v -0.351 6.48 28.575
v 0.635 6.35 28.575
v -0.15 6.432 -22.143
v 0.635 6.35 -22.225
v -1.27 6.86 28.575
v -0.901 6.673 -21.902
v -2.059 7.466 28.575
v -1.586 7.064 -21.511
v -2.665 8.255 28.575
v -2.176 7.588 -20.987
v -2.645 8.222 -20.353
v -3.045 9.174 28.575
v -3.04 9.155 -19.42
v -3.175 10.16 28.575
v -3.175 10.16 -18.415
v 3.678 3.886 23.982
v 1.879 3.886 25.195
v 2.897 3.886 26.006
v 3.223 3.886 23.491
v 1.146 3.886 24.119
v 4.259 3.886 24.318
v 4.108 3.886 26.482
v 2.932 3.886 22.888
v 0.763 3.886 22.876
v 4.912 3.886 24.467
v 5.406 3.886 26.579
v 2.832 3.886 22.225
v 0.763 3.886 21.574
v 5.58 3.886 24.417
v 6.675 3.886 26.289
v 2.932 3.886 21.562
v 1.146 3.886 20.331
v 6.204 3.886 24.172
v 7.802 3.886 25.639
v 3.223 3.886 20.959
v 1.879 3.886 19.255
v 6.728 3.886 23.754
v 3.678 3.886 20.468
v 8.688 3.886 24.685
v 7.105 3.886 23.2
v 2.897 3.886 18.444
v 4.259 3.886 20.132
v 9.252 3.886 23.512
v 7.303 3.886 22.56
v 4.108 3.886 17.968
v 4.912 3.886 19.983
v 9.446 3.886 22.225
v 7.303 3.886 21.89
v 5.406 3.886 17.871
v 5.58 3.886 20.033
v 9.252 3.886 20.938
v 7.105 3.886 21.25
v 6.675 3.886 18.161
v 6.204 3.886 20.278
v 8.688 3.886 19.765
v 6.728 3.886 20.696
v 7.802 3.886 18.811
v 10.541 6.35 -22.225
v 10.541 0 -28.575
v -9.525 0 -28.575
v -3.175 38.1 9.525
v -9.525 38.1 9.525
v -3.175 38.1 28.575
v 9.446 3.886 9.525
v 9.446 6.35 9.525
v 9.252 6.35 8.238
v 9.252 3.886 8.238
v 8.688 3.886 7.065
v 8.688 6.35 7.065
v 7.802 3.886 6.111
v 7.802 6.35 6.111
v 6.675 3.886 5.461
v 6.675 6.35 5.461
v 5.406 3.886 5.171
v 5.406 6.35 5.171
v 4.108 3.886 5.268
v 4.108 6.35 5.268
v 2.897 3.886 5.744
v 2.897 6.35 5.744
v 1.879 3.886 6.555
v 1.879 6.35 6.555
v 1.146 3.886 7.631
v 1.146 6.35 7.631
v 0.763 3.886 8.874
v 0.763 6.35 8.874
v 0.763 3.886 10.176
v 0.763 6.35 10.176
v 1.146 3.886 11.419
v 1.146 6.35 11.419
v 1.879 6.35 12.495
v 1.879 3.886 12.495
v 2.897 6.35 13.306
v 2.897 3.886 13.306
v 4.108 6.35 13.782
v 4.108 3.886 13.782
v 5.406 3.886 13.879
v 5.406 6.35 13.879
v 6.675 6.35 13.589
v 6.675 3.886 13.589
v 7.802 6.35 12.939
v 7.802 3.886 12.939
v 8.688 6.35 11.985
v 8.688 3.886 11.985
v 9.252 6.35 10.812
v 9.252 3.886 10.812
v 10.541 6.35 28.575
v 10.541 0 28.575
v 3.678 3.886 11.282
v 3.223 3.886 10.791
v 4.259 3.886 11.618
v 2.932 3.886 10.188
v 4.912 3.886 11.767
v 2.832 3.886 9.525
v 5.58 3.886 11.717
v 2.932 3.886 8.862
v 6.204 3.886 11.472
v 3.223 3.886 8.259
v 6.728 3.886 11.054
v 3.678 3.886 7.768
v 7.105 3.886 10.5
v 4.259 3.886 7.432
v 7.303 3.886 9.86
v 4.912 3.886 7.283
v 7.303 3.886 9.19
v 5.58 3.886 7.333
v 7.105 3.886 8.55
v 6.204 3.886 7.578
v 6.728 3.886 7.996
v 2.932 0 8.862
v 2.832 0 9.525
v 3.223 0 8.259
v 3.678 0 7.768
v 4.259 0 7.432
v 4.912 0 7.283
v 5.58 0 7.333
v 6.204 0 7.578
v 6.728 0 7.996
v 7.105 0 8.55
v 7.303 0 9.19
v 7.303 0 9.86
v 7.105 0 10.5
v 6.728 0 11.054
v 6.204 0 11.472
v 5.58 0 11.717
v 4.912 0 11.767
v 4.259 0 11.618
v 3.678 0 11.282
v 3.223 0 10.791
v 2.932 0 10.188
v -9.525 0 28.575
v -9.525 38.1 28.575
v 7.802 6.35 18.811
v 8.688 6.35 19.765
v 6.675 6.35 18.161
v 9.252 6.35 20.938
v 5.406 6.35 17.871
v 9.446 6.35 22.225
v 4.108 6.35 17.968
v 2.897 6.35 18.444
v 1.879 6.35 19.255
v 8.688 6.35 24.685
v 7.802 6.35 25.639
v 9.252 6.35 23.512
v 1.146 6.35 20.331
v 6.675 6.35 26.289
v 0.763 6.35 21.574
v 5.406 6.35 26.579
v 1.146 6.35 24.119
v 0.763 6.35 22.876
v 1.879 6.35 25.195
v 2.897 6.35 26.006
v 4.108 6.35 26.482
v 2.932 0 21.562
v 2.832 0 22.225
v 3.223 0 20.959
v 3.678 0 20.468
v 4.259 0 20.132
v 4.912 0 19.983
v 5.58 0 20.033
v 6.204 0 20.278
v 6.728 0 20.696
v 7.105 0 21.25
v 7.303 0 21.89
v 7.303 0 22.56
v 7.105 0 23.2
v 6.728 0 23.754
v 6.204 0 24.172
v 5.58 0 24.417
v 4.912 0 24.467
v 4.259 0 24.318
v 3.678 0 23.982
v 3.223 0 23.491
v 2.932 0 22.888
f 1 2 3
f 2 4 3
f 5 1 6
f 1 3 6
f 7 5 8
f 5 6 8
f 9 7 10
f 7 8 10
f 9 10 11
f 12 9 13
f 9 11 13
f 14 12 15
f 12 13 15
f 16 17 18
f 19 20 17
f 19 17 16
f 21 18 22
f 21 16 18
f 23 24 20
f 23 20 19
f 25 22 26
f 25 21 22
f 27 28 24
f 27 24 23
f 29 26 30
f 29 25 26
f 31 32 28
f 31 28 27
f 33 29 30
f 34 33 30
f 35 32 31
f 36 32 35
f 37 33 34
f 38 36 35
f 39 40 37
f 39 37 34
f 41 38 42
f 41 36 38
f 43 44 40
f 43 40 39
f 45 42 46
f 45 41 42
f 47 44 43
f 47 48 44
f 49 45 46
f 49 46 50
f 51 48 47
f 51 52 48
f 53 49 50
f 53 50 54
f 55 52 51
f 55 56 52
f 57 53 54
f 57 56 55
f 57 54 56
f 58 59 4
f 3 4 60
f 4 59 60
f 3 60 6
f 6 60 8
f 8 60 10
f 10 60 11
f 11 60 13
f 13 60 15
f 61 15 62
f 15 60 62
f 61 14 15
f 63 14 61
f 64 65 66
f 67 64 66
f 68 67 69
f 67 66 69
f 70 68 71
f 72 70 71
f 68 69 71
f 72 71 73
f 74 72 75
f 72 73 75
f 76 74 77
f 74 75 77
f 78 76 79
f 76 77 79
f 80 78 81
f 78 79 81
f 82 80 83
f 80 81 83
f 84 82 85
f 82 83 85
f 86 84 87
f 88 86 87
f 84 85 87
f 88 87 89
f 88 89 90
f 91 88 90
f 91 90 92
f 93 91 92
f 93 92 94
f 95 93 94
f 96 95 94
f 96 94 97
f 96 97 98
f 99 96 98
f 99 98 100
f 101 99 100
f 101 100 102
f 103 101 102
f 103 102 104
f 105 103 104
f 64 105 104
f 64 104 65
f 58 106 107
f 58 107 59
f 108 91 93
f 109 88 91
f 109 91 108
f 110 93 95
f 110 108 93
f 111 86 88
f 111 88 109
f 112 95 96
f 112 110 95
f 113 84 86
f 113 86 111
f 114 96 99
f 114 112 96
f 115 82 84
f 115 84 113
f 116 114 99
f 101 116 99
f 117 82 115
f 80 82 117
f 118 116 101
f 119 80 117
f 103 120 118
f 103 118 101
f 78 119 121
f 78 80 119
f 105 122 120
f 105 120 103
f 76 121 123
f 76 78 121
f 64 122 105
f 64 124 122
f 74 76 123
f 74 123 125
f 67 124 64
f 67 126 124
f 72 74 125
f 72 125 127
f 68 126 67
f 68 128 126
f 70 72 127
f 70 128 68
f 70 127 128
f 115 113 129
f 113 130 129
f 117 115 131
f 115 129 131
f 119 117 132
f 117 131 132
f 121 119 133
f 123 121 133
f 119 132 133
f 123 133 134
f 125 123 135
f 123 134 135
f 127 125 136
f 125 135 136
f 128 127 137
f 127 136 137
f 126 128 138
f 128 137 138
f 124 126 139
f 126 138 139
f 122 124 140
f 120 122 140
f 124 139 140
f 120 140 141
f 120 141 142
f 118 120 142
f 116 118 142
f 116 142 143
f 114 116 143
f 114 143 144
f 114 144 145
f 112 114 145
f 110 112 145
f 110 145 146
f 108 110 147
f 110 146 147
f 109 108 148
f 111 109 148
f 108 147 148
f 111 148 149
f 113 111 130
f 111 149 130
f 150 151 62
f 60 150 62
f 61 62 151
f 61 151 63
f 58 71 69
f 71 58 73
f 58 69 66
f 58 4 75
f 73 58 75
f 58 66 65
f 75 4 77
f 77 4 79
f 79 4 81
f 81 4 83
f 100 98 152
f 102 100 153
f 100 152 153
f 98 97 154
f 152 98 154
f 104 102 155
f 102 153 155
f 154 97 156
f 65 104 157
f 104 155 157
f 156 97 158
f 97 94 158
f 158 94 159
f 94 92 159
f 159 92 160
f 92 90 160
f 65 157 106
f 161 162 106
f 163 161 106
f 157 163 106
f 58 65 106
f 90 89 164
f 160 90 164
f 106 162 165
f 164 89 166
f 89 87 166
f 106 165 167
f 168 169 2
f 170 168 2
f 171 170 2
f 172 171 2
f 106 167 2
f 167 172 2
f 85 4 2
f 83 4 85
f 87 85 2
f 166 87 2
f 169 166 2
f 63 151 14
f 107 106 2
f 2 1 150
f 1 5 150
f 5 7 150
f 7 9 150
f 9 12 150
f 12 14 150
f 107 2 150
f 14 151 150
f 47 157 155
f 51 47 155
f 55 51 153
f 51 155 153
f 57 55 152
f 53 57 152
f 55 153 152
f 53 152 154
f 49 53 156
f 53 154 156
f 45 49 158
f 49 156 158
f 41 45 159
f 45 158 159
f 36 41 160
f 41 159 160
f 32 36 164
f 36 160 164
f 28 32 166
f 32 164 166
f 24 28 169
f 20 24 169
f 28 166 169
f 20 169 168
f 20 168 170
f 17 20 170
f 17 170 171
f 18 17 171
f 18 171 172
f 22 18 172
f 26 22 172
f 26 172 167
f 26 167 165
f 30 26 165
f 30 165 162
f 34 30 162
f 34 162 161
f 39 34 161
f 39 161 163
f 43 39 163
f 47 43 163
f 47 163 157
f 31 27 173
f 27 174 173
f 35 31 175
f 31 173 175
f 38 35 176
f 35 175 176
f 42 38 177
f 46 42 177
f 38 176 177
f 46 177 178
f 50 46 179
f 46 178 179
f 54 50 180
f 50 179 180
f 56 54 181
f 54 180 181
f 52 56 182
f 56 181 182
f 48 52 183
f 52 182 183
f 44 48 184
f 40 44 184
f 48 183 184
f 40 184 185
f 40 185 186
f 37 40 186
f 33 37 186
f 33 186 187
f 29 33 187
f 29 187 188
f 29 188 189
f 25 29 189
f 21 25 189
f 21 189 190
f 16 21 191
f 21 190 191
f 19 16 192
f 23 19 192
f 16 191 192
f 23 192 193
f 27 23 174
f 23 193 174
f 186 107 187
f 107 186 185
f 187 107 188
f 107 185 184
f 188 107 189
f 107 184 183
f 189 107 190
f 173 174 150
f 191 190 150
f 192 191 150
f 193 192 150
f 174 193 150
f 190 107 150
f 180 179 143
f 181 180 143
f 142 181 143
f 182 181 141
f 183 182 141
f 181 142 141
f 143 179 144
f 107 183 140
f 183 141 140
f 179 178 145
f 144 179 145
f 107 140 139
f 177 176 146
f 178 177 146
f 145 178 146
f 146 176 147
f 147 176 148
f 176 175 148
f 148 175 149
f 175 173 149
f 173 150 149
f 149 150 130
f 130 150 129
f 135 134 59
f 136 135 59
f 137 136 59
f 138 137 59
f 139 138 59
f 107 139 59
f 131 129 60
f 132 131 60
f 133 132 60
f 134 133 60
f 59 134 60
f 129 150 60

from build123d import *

# Parameters (mm, degrees)
SKETCH2_W                                      = 19.05
SKETCH2_H                                      = 57.15
BOSS_EXTRUDE2_DEPTH                            = 38.1
CUT_EXTRUDE2_DEPTH                             = 20.05
SKETCH7_W                                      = 25.4
SKETCH7_H                                      = 63.5
CUT_EXTRUDE5_DEPTH                             = 63.5
FILLET3_R                                      = 3.81
CBORE_FOR_8_BUTTON_HEAD_CAP_SCREW1_D           = 4.4958
CBORE_FOR_8_BUTTON_HEAD_CAP_SCREW1_CBORE_D     = 8.73252
CBORE_FOR_8_BUTTON_HEAD_CAP_SCREW1_CBORE_DEPTH = 2.4638
BOSS_EXTRUDE3_DEPTH                            = 1.016


with BuildPart() as part:
    # Sketch2 → Boss-Extrude2 (new body)
    with BuildSketch(Plane(origin=(0, 0, 0), x_dir=(1, 0, 0), z_dir=(0, 1, 0))):
        Rectangle(SKETCH2_W, SKETCH2_H)
    extrude(amount=BOSS_EXTRUDE2_DEPTH)

    # Sketch4 → Cut-Extrude2 (cut, through all)
    with BuildSketch(Plane(origin=(9.525, 0, 0), x_dir=(0, 0, -1), z_dir=(1, 0, 0))):
        Polygon((28.575, 0), (-9.525, 38.1), (28.575, 38.1), align=None)
    extrude(amount=-CUT_EXTRUDE2_DEPTH, mode=Mode.SUBTRACT)

    # Sketch7 → Cut-Extrude5 (cut)
    with BuildSketch(Plane.XY.offset(28.575)):
        with Locations((9.525, 38.1)):
            Rectangle(SKETCH7_W, SKETCH7_H)
    extrude(amount=-CUT_EXTRUDE5_DEPTH, mode=Mode.SUBTRACT)

    # Fillet3
    fillet3_edges = [part.edges().sort_by_distance(p)[0] for p in [
        (-3.175, 6.35, 3.175),
    ]]
    fillet(fillet3_edges, radius=FILLET3_R)

    # CBORE for #8 Button Head Cap Screw1 (through all)
    with Locations(Plane(origin=(0, 6.35, 0), x_dir=(1, 0, 0), z_dir=(0, 1, 0))):
        with Locations((5.08, -22.225), (5.08, -9.525)):
            CounterBoreHole(CBORE_FOR_8_BUTTON_HEAD_CAP_SCREW1_D / 2, CBORE_FOR_8_BUTTON_HEAD_CAP_SCREW1_CBORE_D / 2, CBORE_FOR_8_BUTTON_HEAD_CAP_SCREW1_CBORE_DEPTH)

    # Sketch12 → Boss-Extrude3 (add)
    with BuildSketch(Plane(origin=(9.525, 0, 0), x_dir=(0, 0, -1), z_dir=(1, 0, 0))):
        Polygon((28.575, 0), (22.225, 6.35), (-28.575, 6.35), (-28.575, 0), align=None)
    extrude(amount=BOSS_EXTRUDE3_DEPTH)


solid = part.part
